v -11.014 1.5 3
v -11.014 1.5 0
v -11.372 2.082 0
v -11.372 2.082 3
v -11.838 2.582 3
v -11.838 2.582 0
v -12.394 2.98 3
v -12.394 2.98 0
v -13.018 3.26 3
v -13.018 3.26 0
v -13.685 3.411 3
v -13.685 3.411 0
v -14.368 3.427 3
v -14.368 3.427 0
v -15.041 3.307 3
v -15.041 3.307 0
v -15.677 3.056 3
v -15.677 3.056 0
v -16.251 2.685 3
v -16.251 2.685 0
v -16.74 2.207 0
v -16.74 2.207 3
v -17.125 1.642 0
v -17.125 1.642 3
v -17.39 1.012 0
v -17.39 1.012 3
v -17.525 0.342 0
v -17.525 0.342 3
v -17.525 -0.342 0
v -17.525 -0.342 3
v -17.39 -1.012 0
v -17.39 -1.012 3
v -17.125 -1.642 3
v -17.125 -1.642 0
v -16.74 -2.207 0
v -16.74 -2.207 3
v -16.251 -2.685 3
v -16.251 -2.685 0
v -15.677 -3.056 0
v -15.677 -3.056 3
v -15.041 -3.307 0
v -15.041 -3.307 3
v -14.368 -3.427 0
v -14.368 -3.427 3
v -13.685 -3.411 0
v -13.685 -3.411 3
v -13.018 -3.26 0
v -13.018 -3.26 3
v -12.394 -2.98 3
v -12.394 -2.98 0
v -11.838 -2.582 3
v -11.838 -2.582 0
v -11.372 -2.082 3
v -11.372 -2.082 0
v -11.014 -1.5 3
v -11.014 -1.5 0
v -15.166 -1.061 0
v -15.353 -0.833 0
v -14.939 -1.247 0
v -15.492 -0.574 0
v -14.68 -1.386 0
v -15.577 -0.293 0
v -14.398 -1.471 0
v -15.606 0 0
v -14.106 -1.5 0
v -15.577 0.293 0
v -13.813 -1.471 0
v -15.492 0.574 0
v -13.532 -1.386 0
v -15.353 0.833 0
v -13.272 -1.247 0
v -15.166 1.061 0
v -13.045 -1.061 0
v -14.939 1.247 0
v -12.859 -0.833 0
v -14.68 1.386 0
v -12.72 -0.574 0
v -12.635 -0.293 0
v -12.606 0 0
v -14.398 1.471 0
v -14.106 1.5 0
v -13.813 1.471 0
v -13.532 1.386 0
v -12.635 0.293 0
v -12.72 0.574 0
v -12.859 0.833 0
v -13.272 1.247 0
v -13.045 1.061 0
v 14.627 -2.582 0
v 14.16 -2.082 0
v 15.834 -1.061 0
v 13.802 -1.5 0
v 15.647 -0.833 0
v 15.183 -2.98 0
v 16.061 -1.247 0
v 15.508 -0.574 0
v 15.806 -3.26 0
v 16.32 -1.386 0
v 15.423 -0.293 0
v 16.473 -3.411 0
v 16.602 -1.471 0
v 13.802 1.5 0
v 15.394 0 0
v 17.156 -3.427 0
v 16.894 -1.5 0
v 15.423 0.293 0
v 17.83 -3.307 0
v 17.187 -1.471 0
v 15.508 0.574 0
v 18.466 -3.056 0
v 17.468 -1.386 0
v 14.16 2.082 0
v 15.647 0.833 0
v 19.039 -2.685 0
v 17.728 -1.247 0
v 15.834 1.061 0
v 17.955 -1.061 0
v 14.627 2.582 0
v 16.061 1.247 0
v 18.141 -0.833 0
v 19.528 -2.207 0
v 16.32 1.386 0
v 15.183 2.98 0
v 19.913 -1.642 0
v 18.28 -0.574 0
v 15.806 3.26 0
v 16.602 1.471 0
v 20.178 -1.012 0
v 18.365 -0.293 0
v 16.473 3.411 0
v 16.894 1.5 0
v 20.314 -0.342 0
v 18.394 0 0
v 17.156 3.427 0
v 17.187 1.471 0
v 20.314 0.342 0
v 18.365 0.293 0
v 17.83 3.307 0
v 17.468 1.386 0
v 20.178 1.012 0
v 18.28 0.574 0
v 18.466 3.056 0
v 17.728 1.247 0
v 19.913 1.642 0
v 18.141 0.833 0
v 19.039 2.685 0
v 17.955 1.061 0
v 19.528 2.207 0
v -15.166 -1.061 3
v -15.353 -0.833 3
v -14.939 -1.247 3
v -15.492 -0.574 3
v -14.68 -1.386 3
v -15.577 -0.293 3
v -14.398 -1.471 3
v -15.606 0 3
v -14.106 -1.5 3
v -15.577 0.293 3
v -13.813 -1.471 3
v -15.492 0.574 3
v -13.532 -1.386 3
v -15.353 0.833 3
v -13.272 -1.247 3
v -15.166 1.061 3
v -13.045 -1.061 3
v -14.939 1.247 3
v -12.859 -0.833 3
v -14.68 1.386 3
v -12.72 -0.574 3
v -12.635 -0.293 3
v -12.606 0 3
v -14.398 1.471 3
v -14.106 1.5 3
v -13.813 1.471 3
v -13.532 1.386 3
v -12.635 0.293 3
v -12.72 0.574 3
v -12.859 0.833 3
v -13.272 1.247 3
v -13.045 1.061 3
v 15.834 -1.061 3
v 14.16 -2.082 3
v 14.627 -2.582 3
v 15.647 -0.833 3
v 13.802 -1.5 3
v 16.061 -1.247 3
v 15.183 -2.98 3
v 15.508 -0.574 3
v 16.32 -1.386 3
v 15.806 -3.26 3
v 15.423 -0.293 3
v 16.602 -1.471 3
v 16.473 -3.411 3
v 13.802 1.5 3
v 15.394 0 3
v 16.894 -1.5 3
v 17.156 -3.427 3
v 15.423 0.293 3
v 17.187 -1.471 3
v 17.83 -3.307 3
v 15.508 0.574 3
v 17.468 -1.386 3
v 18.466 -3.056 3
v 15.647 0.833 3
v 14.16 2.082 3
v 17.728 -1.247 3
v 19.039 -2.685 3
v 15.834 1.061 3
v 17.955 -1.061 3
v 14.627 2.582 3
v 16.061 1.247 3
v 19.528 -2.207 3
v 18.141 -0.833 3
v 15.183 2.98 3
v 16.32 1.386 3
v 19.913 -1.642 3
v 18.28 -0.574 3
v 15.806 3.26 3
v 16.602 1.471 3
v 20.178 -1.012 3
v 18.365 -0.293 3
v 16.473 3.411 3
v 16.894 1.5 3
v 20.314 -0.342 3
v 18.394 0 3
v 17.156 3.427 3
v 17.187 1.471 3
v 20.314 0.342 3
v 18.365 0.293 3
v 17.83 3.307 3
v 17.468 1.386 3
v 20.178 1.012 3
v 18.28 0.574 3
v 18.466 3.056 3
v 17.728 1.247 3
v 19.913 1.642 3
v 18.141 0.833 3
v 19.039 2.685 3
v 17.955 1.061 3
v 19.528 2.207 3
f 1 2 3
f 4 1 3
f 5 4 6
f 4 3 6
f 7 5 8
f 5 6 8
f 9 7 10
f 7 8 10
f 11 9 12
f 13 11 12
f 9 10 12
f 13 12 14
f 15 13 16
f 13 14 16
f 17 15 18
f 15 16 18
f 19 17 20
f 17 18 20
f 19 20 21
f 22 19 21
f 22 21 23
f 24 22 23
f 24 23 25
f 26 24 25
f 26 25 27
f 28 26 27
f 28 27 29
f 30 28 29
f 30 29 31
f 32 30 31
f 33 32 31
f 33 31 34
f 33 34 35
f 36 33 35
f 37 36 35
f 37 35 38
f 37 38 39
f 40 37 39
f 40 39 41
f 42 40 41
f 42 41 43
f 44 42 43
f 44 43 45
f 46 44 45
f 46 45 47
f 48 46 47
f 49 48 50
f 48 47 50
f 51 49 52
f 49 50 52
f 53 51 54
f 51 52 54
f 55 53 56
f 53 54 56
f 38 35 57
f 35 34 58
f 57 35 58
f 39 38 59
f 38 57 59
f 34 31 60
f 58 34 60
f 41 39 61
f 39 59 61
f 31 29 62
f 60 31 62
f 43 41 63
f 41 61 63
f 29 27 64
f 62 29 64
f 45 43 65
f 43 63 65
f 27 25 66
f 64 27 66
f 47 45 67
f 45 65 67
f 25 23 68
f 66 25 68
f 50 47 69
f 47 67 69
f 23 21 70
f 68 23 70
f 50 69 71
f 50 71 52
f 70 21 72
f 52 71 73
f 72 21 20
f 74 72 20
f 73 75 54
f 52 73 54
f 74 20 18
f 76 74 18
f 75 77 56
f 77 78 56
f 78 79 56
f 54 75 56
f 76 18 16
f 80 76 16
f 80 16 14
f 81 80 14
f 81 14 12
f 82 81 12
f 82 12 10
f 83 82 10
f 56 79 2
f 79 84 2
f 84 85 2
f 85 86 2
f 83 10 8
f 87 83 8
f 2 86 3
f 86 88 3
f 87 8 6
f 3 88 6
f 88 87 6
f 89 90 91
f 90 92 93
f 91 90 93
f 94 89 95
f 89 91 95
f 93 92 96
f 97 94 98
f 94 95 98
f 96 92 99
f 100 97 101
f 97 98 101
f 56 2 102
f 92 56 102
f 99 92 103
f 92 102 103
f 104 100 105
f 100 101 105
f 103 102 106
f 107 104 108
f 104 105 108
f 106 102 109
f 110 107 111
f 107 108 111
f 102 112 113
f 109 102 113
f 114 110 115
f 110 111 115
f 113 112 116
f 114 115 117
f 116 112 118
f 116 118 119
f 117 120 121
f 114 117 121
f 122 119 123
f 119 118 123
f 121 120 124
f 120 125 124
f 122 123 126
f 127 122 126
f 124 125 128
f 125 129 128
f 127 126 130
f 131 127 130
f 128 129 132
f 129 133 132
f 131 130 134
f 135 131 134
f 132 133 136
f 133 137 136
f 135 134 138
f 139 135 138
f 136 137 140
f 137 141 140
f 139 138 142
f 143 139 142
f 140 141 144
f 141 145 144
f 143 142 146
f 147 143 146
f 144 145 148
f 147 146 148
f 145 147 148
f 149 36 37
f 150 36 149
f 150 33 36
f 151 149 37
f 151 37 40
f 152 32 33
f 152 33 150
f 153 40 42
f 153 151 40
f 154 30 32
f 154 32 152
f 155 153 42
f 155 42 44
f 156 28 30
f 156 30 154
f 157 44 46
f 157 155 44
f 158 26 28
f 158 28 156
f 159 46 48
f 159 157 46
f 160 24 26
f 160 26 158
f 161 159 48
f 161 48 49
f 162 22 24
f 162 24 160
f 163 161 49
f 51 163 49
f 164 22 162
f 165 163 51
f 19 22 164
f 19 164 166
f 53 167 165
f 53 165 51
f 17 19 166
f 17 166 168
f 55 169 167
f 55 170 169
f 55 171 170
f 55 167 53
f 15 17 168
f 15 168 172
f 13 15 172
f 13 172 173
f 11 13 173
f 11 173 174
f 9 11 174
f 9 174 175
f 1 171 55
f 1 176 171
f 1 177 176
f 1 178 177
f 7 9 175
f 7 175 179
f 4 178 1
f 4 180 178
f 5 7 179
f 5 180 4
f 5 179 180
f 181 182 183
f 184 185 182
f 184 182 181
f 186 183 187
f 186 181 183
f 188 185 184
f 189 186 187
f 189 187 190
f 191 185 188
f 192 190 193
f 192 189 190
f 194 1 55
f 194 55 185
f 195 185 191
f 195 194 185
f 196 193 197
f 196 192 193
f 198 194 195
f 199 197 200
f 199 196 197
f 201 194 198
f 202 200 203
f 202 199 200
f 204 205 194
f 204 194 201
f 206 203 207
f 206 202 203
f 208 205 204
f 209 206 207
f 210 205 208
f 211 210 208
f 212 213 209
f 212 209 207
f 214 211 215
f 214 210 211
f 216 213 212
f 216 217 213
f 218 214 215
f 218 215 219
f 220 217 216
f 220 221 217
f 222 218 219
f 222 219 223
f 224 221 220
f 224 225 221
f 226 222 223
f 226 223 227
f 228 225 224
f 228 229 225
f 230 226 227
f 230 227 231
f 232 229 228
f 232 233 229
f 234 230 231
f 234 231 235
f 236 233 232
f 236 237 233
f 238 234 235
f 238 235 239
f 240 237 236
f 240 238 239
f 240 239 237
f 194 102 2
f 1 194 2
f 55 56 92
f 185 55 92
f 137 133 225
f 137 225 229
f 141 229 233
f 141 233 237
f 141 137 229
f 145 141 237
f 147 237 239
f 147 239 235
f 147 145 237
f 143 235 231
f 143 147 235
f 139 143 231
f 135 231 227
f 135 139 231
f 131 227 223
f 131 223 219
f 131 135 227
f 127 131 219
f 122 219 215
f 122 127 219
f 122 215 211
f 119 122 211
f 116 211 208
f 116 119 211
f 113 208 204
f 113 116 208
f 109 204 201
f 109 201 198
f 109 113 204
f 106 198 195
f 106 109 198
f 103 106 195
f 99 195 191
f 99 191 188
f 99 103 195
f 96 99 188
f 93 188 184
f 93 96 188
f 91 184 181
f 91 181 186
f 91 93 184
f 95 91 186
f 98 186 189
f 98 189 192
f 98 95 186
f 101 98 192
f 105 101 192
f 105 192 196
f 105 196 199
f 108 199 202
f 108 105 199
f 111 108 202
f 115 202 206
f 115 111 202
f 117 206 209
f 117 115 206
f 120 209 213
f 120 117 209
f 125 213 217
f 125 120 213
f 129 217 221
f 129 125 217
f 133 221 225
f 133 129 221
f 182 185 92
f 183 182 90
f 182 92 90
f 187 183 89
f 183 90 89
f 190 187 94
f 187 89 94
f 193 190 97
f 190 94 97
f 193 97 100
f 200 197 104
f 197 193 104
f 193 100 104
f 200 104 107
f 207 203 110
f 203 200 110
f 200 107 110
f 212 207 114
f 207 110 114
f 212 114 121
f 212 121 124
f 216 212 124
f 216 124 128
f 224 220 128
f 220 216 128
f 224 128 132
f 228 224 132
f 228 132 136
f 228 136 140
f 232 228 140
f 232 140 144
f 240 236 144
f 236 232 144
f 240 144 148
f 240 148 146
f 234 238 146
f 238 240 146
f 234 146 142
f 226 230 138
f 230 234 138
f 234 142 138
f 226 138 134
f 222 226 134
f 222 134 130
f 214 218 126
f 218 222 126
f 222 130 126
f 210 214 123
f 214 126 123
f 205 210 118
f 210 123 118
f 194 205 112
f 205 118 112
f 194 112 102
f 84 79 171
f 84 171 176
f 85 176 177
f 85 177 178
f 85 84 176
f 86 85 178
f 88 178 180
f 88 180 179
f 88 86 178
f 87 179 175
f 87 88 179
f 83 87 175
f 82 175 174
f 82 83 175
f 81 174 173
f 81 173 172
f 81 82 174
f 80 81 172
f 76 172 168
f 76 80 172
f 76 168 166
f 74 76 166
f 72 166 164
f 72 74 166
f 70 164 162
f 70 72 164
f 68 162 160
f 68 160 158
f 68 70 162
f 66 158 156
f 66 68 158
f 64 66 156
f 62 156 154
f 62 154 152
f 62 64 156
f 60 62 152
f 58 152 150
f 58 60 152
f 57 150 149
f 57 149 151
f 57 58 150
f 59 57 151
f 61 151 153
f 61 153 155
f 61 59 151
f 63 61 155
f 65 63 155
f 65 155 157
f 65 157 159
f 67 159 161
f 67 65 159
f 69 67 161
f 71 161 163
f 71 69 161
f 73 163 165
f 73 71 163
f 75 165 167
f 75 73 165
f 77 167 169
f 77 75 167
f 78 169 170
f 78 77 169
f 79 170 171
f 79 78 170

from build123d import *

# Parameters (mm, degrees)
SKETCH2_R           = 3.436597574
SKETCH2_R_2         = 1.5
BOSS_EXTRUDE1_DEPTH = 3


with BuildPart() as part:
    # Sketch2 → Boss-Extrude1 (new body)
    # profile 1 of 3: a face of its own
    with BuildSketch(Plane.XY):
        with Locations((-14.105820106, 0)):
            Circle(SKETCH2_R)
        with Locations((-14.105820106, 0)):
            Circle(SKETCH2_R_2, mode=Mode.SUBTRACT)
    # profile 2 of 3: a face of its own
    with BuildSketch(Plane.XY):
        with BuildLine():
            Line((13.802222119, 1.5), (-11.01386233, 1.5))
            ThreePointArc((-11.01386233, 1.5), (-10.756490511, 0.769541518), (-10.669222532, 0))
            ThreePointArc((-10.669222532, 0), (-10.756490511, -0.769541518), (-11.01386233, -1.5))
            Line((-11.01386233, -1.5), (13.802222119, -1.5))
            ThreePointArc((13.802222119, -1.5), (13.45758232, 0), (13.802222119, 1.5))
        make_face()
    # profile 3 of 3: a face of its own
    with BuildSketch(Plane.XY):
        with Locations((16.894179894, 0)):
            Circle(SKETCH2_R)
        with Locations((16.894179894, 0)):
            Circle(SKETCH2_R_2, mode=Mode.SUBTRACT)
    extrude(amount=BOSS_EXTRUDE1_DEPTH)


solid = part.part
